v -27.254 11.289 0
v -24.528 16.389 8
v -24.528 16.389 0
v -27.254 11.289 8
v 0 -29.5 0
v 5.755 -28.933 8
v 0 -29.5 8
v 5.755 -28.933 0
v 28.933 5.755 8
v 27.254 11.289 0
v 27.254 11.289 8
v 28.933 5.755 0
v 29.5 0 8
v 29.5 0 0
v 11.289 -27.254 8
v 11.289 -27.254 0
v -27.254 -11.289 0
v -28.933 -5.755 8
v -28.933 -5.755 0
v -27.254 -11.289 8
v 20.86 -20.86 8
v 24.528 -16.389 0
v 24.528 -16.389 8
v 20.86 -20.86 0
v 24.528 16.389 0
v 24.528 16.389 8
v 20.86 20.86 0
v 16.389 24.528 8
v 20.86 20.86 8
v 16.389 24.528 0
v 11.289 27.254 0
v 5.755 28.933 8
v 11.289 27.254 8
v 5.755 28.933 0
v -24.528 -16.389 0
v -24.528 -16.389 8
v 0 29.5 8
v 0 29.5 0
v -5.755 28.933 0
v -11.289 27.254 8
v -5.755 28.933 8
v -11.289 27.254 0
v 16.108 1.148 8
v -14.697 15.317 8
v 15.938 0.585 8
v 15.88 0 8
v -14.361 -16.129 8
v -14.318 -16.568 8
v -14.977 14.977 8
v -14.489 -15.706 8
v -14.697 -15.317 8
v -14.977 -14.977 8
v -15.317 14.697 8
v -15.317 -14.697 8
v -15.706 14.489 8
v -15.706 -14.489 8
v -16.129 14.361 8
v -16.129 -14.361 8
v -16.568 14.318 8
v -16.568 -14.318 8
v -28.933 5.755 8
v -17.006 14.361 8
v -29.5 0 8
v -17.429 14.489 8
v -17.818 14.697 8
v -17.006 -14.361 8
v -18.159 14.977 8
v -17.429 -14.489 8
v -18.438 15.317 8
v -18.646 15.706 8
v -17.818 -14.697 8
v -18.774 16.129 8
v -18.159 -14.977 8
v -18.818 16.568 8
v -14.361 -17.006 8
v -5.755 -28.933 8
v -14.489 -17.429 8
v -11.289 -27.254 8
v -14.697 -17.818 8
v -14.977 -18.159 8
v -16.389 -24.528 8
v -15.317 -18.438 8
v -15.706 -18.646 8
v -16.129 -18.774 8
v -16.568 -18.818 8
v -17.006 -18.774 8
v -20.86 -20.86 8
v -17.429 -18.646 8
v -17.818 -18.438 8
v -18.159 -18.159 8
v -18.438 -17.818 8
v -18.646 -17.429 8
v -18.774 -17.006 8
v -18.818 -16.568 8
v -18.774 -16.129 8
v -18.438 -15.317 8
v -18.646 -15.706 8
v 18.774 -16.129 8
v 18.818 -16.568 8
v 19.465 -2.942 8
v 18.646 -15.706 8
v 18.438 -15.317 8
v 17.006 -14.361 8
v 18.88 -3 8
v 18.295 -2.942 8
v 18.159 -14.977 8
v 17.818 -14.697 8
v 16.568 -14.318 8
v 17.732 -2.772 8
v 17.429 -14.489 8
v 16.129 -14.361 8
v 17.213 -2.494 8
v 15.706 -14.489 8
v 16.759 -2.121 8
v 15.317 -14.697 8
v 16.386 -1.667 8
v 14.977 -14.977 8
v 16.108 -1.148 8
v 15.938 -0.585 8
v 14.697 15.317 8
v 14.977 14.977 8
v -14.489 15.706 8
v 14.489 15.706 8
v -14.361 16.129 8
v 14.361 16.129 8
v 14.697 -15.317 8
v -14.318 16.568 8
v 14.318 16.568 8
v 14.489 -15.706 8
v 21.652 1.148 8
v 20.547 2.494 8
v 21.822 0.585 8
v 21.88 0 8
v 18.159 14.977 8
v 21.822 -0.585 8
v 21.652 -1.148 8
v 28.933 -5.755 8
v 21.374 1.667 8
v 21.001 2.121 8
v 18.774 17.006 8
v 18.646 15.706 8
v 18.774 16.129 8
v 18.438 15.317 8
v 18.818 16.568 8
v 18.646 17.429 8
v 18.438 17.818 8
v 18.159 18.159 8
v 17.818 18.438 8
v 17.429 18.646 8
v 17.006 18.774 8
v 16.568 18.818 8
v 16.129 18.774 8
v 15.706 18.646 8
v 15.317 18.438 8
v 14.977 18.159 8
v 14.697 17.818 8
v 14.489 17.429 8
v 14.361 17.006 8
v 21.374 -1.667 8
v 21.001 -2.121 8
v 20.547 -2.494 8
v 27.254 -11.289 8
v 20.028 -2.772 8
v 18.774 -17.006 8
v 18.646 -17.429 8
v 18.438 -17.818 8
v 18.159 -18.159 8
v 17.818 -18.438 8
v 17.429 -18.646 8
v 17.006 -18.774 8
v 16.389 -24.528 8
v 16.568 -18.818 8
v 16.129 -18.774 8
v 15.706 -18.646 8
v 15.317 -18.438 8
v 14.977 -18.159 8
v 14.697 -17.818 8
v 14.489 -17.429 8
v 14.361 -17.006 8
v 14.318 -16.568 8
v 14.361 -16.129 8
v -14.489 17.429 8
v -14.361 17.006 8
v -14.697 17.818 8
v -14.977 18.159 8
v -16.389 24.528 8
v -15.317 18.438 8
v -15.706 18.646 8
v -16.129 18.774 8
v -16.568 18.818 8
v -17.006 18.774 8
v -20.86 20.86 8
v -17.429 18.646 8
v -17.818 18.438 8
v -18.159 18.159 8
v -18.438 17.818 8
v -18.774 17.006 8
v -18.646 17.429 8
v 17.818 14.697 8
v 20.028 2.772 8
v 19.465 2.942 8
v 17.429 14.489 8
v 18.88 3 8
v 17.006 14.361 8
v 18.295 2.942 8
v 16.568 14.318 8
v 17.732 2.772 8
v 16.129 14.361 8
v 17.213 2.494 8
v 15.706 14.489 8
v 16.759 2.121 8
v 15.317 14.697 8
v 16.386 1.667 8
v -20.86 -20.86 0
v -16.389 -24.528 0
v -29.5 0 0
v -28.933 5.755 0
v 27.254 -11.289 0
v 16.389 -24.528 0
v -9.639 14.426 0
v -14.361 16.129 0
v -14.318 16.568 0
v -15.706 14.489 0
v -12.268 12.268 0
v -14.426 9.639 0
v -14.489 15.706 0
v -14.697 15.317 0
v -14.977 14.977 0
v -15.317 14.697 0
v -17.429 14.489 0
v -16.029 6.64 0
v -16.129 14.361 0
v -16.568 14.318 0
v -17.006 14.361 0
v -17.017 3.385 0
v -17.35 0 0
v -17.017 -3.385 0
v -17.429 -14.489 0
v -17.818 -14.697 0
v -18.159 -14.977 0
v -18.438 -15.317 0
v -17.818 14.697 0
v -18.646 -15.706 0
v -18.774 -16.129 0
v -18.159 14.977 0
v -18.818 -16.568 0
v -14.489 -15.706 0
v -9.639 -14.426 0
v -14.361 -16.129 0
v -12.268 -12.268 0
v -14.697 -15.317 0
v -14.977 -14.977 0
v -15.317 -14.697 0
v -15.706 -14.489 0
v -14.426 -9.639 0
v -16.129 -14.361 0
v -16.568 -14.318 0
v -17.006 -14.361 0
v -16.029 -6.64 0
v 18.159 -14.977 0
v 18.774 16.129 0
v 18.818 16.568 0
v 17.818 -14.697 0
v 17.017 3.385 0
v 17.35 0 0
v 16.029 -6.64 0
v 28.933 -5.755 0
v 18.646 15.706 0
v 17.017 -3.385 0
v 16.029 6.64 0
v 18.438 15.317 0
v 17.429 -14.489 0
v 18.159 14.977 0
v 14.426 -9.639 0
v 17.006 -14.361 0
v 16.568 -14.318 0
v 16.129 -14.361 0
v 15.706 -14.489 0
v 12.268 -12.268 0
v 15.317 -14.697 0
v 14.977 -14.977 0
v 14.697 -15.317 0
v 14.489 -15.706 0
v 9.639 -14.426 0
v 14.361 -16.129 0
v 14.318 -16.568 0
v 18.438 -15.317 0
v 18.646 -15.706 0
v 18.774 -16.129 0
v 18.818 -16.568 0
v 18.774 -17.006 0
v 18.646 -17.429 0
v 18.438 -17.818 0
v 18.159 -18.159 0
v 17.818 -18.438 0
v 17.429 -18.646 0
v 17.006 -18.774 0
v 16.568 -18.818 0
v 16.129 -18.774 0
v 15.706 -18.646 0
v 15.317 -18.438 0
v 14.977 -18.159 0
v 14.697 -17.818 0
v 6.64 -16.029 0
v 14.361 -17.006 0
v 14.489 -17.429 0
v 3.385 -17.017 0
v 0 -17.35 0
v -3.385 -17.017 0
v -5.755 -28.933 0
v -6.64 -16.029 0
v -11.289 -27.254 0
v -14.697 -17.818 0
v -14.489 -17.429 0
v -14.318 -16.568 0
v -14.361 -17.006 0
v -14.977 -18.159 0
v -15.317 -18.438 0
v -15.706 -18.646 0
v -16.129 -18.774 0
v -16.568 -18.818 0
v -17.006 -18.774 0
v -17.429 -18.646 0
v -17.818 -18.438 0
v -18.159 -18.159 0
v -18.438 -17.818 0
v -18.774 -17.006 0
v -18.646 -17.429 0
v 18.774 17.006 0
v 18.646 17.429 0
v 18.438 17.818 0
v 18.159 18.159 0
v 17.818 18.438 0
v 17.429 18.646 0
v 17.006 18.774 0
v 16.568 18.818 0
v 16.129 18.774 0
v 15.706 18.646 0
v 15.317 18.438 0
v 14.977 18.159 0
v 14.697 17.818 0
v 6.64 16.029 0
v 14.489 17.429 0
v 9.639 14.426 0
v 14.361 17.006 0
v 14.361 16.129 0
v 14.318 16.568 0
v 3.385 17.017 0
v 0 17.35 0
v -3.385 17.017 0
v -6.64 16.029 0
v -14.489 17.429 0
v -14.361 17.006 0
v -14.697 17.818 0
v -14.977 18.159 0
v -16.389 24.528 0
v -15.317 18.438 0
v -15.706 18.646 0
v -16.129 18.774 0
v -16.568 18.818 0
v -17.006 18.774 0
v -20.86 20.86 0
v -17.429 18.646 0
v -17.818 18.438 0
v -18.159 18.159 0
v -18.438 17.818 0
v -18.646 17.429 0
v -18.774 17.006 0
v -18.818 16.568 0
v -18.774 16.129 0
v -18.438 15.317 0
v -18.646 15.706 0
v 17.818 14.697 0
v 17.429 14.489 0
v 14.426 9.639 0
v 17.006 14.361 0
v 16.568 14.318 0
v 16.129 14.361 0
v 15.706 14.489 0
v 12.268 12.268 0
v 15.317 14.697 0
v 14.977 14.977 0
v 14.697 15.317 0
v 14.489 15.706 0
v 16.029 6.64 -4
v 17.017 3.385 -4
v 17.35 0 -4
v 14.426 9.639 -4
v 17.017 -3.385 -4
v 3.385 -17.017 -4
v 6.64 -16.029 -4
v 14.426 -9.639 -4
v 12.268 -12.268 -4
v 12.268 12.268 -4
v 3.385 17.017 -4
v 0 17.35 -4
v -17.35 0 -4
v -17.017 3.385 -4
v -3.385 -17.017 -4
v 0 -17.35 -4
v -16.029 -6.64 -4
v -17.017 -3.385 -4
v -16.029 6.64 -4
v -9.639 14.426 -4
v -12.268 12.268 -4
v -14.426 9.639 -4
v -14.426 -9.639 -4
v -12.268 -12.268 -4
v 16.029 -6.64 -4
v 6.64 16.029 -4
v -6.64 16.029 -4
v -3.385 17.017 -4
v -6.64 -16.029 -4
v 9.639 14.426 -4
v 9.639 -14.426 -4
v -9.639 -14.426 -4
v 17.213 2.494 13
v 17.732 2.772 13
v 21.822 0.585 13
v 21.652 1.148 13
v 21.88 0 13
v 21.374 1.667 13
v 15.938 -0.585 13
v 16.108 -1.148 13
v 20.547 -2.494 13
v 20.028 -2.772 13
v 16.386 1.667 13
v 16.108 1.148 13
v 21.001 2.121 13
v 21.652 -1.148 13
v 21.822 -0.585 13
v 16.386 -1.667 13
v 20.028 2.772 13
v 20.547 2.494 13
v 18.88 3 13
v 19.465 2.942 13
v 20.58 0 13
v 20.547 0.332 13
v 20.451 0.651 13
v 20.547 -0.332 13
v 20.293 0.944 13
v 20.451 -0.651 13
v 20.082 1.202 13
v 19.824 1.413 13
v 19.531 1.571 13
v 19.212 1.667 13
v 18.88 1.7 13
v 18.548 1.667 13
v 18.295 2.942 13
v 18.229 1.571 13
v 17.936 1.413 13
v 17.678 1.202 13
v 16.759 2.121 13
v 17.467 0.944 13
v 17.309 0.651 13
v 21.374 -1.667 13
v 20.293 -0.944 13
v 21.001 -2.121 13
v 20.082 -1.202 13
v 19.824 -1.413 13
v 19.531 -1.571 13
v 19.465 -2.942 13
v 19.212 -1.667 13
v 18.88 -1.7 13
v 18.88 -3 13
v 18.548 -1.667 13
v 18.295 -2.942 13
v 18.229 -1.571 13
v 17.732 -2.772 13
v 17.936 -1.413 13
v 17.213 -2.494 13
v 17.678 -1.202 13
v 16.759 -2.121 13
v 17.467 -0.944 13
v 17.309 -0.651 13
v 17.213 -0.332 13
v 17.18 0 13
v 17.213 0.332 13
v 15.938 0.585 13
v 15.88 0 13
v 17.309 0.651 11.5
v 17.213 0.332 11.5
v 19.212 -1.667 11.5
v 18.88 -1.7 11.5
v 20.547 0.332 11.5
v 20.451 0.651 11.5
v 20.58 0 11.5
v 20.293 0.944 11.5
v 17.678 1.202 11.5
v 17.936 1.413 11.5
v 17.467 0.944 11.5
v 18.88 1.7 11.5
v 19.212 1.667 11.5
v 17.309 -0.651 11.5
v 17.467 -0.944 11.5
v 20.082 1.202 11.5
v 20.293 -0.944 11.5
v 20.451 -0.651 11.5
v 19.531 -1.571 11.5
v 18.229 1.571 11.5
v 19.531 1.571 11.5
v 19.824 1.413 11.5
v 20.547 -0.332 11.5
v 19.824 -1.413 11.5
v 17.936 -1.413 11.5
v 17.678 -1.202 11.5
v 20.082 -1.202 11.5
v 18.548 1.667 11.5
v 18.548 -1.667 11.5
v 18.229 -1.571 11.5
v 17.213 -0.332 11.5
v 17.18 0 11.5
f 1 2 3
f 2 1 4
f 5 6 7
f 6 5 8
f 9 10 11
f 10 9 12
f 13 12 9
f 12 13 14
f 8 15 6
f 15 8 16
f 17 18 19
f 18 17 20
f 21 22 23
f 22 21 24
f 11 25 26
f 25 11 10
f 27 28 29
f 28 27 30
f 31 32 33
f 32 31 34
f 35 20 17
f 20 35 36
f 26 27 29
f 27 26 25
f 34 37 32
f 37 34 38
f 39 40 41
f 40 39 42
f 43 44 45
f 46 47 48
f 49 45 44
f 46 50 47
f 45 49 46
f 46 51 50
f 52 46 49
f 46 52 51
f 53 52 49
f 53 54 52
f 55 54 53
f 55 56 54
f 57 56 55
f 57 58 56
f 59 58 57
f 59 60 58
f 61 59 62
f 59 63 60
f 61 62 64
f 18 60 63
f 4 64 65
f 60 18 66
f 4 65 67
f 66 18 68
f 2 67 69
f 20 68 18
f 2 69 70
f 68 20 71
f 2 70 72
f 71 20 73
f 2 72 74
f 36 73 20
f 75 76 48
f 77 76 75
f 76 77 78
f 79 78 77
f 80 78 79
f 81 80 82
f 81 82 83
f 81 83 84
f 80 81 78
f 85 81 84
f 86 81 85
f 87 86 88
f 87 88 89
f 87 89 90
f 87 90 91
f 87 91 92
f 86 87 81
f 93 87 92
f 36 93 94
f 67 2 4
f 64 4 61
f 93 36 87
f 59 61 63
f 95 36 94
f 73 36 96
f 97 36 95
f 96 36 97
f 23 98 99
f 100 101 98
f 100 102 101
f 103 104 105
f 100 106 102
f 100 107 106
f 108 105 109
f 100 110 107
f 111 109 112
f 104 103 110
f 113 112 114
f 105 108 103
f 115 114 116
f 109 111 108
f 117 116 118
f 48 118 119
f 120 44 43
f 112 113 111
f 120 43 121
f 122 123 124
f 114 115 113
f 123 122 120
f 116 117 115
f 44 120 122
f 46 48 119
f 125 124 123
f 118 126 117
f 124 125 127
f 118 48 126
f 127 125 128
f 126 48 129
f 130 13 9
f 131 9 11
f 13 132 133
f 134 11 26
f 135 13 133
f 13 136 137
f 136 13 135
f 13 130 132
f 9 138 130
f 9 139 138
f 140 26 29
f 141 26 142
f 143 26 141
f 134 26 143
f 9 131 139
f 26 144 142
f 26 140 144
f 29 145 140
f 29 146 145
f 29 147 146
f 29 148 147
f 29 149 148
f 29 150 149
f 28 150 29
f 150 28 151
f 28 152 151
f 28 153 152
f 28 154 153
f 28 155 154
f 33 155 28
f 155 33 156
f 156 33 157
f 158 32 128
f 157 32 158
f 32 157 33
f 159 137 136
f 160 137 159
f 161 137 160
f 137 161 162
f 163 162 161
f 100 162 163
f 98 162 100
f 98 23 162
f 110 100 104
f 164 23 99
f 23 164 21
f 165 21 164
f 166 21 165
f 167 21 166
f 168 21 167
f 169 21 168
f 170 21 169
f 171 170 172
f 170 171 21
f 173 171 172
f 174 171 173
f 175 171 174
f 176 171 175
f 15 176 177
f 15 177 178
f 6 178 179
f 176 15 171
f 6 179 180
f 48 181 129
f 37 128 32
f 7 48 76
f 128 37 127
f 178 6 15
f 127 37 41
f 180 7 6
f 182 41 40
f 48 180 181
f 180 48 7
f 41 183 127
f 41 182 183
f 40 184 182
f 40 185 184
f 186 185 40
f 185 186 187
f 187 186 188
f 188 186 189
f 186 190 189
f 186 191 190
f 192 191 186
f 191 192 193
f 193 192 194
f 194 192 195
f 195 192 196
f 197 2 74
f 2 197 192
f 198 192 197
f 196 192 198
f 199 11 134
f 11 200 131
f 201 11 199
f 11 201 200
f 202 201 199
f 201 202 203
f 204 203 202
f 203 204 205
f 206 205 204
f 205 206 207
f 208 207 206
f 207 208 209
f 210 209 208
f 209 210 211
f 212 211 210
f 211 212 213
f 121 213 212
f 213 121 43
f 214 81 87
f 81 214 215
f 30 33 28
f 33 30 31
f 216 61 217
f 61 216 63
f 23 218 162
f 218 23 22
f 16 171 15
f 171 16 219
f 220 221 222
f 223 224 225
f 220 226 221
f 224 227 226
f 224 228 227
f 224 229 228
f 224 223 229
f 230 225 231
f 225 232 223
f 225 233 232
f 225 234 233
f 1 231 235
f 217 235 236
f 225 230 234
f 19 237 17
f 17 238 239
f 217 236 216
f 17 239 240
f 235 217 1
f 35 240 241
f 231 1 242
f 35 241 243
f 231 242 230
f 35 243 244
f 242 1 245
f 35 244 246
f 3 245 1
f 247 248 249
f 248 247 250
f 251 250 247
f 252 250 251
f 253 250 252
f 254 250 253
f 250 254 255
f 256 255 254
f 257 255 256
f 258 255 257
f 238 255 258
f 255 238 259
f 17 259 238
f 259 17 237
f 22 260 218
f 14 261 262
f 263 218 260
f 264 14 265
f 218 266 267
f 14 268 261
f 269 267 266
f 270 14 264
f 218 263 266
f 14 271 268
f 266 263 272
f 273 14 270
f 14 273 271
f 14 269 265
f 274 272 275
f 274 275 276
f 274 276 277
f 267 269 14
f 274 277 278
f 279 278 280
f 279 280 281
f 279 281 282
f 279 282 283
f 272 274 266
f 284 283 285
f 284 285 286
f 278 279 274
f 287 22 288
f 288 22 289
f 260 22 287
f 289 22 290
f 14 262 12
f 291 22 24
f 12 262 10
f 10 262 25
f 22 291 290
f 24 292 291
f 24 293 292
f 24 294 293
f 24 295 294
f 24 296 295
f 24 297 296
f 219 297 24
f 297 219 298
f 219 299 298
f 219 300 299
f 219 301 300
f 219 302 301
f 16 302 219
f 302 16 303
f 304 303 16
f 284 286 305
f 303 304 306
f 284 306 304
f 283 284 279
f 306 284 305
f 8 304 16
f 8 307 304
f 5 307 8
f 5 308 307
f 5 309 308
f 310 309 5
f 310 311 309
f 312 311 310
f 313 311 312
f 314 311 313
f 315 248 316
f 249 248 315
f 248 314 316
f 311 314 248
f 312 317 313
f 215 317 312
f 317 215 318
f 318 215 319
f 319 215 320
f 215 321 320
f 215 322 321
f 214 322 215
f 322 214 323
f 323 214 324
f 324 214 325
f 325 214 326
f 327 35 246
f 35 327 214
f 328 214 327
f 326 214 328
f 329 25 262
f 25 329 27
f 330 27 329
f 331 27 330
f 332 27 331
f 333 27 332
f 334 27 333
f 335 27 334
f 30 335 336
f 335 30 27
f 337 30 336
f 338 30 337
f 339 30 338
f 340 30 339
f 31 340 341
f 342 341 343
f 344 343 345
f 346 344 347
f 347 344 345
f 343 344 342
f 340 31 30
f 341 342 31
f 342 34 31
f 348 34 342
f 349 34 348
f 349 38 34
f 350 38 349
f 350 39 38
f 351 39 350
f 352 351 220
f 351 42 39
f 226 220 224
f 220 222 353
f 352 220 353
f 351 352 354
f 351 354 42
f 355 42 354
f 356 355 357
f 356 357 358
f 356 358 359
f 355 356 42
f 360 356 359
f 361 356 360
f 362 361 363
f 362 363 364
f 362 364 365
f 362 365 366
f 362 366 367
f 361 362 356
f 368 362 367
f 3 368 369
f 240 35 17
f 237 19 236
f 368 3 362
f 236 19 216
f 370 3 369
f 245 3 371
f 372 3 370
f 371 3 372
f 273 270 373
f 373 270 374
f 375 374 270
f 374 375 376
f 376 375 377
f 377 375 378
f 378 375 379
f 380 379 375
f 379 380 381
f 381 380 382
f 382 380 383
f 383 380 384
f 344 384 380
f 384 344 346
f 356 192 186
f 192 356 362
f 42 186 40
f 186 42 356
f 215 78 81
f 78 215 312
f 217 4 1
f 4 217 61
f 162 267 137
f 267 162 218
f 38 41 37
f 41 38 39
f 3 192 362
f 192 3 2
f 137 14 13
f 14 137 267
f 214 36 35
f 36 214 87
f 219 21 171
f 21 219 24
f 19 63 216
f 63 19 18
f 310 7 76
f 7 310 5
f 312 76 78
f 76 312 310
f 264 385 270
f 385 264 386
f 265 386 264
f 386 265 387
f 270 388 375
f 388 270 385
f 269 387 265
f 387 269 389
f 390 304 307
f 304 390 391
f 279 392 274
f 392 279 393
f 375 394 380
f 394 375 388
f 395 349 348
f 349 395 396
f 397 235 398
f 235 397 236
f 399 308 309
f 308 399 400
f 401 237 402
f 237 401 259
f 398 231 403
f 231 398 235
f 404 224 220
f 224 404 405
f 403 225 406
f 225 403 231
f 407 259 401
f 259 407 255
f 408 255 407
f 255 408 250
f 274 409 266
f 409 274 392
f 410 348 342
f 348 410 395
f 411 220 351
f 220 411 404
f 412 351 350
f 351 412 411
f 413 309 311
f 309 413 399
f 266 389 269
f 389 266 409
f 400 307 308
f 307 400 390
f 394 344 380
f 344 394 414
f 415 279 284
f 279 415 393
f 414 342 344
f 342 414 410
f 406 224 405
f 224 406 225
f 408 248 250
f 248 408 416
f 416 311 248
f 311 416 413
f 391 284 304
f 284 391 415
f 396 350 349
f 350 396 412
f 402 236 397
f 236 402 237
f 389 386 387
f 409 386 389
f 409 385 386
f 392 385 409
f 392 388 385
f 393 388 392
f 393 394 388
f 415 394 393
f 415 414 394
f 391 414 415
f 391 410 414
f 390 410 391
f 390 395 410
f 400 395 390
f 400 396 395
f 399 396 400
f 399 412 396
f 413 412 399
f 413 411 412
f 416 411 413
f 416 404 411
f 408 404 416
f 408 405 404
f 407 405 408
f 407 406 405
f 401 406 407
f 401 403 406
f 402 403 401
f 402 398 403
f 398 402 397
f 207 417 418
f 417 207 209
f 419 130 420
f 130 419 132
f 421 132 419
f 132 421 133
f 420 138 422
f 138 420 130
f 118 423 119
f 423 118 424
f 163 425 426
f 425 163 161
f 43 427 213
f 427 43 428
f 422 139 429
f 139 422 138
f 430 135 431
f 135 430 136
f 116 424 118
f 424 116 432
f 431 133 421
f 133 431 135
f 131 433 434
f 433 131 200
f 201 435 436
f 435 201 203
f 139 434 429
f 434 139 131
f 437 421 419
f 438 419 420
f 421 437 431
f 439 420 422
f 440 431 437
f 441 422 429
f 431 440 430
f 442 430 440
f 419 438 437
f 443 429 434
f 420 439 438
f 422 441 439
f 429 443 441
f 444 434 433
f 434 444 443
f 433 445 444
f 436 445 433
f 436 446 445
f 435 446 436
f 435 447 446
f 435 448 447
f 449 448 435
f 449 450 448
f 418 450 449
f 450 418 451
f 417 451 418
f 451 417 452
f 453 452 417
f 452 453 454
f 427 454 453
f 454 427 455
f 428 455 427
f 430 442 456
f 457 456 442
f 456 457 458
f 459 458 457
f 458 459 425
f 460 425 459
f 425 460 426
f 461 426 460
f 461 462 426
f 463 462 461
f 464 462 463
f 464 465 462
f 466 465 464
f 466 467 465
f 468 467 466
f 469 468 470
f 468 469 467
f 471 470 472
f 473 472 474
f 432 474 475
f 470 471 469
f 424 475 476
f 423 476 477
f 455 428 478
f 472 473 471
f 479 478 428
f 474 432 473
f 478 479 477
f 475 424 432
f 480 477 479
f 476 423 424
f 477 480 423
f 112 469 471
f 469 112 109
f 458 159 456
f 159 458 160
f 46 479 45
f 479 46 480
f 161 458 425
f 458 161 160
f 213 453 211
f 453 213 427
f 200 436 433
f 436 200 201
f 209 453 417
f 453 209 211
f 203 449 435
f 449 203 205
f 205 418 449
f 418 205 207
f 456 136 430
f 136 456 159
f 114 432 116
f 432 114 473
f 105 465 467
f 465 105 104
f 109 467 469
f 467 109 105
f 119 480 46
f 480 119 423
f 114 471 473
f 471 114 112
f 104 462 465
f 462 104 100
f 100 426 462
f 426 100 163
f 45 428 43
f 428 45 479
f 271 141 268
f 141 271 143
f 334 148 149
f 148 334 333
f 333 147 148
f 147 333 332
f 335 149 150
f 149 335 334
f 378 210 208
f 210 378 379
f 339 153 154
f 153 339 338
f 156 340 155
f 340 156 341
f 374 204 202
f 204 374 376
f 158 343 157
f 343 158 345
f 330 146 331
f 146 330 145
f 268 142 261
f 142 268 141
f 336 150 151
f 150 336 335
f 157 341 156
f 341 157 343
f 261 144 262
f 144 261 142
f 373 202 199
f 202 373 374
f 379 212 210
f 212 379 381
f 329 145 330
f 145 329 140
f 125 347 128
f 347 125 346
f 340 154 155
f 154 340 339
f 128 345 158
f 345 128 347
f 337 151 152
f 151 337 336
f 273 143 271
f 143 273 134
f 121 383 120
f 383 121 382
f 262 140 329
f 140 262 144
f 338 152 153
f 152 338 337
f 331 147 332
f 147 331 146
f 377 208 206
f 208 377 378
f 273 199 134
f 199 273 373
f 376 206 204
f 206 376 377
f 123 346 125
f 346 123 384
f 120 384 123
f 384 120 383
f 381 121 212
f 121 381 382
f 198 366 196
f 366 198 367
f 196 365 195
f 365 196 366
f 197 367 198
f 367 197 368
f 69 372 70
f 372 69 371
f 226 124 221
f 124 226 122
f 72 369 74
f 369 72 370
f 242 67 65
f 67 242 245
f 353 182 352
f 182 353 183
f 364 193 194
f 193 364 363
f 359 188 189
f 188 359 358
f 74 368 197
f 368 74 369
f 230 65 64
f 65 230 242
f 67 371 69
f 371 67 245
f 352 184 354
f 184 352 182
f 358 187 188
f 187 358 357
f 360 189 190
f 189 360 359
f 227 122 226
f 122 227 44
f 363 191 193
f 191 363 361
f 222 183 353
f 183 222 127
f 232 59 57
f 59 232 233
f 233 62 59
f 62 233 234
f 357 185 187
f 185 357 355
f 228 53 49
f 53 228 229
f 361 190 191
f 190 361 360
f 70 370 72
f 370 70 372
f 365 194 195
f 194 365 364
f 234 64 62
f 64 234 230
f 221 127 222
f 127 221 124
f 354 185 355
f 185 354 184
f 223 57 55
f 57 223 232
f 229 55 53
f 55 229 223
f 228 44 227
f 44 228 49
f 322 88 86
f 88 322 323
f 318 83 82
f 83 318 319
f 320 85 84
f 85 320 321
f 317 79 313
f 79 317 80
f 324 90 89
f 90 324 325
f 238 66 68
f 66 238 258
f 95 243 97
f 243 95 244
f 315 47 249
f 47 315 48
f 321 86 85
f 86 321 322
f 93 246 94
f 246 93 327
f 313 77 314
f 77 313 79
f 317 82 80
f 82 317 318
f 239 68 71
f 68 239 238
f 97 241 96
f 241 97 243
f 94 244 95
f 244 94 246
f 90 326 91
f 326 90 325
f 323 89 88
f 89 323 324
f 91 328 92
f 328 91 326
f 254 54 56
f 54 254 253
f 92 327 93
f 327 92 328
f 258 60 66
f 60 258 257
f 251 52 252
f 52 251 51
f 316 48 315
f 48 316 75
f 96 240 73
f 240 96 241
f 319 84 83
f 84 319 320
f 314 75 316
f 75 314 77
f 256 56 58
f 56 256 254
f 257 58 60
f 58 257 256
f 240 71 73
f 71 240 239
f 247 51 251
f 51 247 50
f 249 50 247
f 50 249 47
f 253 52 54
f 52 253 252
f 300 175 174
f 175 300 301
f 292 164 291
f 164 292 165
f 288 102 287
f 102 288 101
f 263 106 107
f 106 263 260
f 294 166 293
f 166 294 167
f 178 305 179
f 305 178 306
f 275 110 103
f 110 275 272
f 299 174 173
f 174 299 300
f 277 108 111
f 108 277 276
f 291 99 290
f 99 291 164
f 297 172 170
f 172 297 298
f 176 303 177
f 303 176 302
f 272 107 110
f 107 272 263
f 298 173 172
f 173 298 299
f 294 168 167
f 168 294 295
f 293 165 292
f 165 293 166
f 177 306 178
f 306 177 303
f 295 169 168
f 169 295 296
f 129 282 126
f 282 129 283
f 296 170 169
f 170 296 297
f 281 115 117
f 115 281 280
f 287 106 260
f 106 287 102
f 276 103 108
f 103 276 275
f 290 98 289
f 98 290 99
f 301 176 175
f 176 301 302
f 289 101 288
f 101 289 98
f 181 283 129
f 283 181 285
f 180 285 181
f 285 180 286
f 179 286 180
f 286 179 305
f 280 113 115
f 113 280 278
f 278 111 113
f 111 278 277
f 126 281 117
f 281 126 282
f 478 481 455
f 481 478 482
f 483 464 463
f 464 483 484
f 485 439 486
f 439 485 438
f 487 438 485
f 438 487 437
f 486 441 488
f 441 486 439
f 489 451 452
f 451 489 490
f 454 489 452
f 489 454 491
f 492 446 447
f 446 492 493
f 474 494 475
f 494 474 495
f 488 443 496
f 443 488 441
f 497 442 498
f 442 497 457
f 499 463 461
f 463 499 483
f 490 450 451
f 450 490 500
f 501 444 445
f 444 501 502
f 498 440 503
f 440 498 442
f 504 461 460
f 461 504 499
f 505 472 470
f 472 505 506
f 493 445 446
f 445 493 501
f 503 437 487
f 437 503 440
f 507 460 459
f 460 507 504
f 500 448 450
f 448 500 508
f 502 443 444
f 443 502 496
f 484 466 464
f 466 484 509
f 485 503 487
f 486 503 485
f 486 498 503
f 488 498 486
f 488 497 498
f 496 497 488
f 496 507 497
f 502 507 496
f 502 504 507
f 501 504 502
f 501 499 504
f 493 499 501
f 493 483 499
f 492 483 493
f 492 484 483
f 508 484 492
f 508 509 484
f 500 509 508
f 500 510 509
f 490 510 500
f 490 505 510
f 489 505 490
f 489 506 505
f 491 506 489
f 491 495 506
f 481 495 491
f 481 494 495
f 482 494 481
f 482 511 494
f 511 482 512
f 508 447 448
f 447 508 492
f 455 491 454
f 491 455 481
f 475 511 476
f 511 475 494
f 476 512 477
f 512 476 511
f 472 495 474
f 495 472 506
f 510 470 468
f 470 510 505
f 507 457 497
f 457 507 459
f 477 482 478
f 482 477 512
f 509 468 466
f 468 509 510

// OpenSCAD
$fn = 32;

// ----------------------------------------------------------------------
// Retaining cap: 6202 cover, 59 mm, spigot 34.7 mm
// ----------------------------------------------------------------------

// --- parameters (mm) ---
plate_d = 59;             // cover diameter
plate_t = 8;              // cover thickness
boss_d = 34.7;            // spigot that enters the housing
boss_h = 4;               // spigot height
bolt_d = 4.5;             // bolt clearance
bolt_r = 23.43;           // bolt circle radius
nipple_d = 6;             // grease nipple boss
nipple_h = 5;             // grease nipple boss height

module cover() {
  cylinder(h = plate_t, d = plate_d);
}

module spigot() {
  /* sunk 1 mm into the cover; the spigot sets the overall height */
  translate([0, 0, -boss_h]) cylinder(h = boss_h + 1, d = boss_d);
}

module nipple() {
  translate([plate_d * 0.32, 0, plate_t - 1])
    cylinder(h = nipple_h + 1, d = nipple_d);
}

difference() {
  union() {
    cover();
    spigot();
    nipple();
  }
  for (i = [0 : 3]) rotate([0, 0, 45 + i * 90]) translate([bolt_r, 0, -boss_h - 1])
    cylinder(h = boss_h + plate_t + 2, d = bolt_d);
  translate([plate_d * 0.32, 0, plate_t + nipple_h - 1.5]) cylinder(h = 4, d = 3.4);
}
